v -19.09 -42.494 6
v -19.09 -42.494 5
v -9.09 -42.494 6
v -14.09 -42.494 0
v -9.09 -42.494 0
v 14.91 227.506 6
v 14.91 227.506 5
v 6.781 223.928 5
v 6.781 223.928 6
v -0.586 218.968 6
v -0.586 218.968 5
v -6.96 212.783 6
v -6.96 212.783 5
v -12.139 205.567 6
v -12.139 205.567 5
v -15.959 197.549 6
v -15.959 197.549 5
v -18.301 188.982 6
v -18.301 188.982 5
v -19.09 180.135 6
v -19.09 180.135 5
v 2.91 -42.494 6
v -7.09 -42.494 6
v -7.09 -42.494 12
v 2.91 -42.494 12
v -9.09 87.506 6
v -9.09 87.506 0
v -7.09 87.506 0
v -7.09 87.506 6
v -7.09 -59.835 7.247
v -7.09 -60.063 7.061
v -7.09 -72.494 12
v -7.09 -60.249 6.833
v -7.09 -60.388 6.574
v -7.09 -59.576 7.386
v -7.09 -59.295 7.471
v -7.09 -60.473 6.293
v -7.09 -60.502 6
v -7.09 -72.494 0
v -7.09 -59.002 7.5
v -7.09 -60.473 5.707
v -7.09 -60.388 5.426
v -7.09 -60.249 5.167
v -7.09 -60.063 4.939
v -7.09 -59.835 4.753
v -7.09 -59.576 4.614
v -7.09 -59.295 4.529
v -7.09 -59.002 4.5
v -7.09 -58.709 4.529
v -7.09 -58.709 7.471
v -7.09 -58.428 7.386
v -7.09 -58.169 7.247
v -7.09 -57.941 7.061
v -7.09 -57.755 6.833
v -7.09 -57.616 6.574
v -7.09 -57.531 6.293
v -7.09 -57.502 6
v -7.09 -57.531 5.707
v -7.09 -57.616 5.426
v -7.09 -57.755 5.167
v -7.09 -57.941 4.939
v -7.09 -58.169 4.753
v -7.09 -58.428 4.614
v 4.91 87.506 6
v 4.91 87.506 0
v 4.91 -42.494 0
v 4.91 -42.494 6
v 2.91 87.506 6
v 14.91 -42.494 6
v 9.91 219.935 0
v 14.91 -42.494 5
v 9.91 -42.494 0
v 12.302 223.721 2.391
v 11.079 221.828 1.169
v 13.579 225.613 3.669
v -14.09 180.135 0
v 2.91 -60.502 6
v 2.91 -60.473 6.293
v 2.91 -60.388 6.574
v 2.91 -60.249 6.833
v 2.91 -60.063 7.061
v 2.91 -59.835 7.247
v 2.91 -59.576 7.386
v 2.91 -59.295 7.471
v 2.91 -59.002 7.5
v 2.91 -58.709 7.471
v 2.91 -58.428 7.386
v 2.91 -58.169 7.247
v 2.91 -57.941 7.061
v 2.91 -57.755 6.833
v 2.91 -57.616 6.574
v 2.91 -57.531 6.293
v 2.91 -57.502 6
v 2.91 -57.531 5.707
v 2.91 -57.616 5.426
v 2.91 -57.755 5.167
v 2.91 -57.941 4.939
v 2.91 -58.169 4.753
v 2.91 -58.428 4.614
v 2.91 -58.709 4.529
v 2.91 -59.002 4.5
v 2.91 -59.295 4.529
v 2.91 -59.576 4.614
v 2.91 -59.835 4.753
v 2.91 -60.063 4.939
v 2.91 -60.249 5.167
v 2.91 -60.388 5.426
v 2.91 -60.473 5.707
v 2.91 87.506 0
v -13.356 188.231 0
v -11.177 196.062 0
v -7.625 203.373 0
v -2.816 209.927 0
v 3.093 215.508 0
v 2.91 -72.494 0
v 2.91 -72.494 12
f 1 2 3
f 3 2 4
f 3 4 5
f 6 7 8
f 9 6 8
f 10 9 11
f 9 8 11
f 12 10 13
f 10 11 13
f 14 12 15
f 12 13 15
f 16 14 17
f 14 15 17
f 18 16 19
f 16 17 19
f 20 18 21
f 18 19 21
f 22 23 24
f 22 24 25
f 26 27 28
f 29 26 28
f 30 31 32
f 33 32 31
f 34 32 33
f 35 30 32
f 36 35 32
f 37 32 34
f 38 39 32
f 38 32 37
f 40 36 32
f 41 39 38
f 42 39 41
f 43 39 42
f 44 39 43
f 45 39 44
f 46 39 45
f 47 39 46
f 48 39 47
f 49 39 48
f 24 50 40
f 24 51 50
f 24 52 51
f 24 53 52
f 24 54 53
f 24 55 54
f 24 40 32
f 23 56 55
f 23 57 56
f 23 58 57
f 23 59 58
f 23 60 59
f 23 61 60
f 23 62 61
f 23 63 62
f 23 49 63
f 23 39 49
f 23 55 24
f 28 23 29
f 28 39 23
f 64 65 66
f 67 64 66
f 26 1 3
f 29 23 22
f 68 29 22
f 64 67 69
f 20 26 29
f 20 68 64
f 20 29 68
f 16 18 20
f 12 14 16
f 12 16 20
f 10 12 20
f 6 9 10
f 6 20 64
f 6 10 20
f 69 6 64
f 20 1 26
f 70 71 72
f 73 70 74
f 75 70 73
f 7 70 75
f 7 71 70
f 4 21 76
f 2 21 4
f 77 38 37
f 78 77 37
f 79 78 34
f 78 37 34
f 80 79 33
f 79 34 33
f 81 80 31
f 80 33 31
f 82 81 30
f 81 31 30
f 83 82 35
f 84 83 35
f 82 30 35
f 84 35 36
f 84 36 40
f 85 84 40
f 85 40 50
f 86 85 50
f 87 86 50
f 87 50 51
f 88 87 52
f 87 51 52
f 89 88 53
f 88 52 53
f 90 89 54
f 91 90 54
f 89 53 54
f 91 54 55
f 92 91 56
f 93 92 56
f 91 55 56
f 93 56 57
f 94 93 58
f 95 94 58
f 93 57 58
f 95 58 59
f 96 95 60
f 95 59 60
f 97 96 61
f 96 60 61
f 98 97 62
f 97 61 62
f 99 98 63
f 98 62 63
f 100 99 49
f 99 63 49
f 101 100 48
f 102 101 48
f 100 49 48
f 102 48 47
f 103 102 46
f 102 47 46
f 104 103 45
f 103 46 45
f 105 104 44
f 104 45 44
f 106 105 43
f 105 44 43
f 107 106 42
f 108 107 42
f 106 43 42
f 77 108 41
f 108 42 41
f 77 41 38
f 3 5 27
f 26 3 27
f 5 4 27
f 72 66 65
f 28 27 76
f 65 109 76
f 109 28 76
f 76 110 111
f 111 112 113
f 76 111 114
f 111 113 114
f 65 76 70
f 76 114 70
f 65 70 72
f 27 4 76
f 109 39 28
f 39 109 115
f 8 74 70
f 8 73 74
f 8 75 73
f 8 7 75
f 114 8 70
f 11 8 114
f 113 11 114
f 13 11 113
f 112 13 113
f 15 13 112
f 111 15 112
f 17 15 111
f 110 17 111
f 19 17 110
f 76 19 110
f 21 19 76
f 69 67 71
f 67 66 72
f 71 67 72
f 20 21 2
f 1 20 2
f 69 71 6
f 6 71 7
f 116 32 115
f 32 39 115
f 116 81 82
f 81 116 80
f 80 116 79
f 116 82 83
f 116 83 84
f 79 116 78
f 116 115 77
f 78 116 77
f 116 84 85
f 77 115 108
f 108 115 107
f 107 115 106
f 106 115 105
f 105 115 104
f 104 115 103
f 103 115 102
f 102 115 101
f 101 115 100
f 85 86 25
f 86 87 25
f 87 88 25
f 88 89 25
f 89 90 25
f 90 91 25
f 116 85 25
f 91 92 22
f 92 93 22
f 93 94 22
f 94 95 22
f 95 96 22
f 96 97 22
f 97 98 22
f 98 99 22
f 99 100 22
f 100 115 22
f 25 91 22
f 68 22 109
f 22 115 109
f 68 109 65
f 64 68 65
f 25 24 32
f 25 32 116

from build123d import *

# Parameters (mm, degrees)
F1_DEPTH    = 6
F2_T1_DEPTH = 242.8543856465
F3_W        = 10
F3_H        = 30
F4_DEPTH    = 6
F5_R        = 1.5
F6_DEPTH    = 10
F7_SIZE     = 5


# Not quite as in the source:
# - a fillet or chamfer that OpenCascade refuses, or shapes differently, is made with other operations: its cross-section is extruded or revolved along the edge and cut away or added


with BuildPart() as f1:
    # F0 (on Top) → F1 (new body)
    with BuildSketch(Plane.XY):
        Polygon((14.9102990106, 227.5062542017), (-19.0897009894, 227.5062542017), (-19.0897009894, -42.4937457983), (-9.0897009894, -42.4937457983), (-9.0897009894, 87.5062542017), (-7.0897009894, 87.5062542017), (-7.0897009894, -72.4937457983), (2.9102990106, -72.4937457983), (2.9102990106, 87.5062542017), (4.9102990106, 87.5062542017), (4.9102990106, -42.4937457983), (14.9102990106, -42.4937457983), align=None)
    extrude(amount=F1_DEPTH)

    # F2: fillet of radius 50 on 1 edges, made by hand

    # F2_s2 → F2_t1 (cut)
    with BuildSketch(Plane.XY.offset(-118.4271928233)):
        with BuildLine():
            ThreePointArc((14.9102990106, 227.5062542017), (-9.7098930126, 209.2901365467), (-19.0897009894, 180.1353770724))
            Line((-19.0897009894, 180.1353770724), (-19.0897009894, 227.5062542017))
            Line((-19.0897009894, 227.5062542017), (14.9102990106, 227.5062542017))
        make_face()
    extrude(amount=F2_T1_DEPTH, mode=Mode.SUBTRACT)

    # F3 (on face) → F4 (join)
    with BuildSketch(Plane.XY.offset(6)):
        with Locations((-2.0897009894, -57.4937457983)):
            Rectangle(F3_W, F3_H)
    extrude(amount=F4_DEPTH)

    # F5 (on face) → F6 (cut, through all)
    with BuildSketch(Plane(origin=(-7.0897009894, 0, 0), x_dir=(0, -1, 0), z_dir=(-1, 0, 0))):
        with Locations((59.0019002557, 6)):
            Circle(F5_R)
    extrude(amount=-F6_DEPTH, mode=Mode.SUBTRACT)

    # F7
    f7_edges = [f1.edges().sort_by_distance(p)[0] for p in [
        (14.910299, 92.506254, 0),
        (-19.089701, 68.820816, 0),
        (-9.709893, 209.290137, 0),
    ]]
    chamfer(f7_edges, length=F7_SIZE)


solid = f1.part
